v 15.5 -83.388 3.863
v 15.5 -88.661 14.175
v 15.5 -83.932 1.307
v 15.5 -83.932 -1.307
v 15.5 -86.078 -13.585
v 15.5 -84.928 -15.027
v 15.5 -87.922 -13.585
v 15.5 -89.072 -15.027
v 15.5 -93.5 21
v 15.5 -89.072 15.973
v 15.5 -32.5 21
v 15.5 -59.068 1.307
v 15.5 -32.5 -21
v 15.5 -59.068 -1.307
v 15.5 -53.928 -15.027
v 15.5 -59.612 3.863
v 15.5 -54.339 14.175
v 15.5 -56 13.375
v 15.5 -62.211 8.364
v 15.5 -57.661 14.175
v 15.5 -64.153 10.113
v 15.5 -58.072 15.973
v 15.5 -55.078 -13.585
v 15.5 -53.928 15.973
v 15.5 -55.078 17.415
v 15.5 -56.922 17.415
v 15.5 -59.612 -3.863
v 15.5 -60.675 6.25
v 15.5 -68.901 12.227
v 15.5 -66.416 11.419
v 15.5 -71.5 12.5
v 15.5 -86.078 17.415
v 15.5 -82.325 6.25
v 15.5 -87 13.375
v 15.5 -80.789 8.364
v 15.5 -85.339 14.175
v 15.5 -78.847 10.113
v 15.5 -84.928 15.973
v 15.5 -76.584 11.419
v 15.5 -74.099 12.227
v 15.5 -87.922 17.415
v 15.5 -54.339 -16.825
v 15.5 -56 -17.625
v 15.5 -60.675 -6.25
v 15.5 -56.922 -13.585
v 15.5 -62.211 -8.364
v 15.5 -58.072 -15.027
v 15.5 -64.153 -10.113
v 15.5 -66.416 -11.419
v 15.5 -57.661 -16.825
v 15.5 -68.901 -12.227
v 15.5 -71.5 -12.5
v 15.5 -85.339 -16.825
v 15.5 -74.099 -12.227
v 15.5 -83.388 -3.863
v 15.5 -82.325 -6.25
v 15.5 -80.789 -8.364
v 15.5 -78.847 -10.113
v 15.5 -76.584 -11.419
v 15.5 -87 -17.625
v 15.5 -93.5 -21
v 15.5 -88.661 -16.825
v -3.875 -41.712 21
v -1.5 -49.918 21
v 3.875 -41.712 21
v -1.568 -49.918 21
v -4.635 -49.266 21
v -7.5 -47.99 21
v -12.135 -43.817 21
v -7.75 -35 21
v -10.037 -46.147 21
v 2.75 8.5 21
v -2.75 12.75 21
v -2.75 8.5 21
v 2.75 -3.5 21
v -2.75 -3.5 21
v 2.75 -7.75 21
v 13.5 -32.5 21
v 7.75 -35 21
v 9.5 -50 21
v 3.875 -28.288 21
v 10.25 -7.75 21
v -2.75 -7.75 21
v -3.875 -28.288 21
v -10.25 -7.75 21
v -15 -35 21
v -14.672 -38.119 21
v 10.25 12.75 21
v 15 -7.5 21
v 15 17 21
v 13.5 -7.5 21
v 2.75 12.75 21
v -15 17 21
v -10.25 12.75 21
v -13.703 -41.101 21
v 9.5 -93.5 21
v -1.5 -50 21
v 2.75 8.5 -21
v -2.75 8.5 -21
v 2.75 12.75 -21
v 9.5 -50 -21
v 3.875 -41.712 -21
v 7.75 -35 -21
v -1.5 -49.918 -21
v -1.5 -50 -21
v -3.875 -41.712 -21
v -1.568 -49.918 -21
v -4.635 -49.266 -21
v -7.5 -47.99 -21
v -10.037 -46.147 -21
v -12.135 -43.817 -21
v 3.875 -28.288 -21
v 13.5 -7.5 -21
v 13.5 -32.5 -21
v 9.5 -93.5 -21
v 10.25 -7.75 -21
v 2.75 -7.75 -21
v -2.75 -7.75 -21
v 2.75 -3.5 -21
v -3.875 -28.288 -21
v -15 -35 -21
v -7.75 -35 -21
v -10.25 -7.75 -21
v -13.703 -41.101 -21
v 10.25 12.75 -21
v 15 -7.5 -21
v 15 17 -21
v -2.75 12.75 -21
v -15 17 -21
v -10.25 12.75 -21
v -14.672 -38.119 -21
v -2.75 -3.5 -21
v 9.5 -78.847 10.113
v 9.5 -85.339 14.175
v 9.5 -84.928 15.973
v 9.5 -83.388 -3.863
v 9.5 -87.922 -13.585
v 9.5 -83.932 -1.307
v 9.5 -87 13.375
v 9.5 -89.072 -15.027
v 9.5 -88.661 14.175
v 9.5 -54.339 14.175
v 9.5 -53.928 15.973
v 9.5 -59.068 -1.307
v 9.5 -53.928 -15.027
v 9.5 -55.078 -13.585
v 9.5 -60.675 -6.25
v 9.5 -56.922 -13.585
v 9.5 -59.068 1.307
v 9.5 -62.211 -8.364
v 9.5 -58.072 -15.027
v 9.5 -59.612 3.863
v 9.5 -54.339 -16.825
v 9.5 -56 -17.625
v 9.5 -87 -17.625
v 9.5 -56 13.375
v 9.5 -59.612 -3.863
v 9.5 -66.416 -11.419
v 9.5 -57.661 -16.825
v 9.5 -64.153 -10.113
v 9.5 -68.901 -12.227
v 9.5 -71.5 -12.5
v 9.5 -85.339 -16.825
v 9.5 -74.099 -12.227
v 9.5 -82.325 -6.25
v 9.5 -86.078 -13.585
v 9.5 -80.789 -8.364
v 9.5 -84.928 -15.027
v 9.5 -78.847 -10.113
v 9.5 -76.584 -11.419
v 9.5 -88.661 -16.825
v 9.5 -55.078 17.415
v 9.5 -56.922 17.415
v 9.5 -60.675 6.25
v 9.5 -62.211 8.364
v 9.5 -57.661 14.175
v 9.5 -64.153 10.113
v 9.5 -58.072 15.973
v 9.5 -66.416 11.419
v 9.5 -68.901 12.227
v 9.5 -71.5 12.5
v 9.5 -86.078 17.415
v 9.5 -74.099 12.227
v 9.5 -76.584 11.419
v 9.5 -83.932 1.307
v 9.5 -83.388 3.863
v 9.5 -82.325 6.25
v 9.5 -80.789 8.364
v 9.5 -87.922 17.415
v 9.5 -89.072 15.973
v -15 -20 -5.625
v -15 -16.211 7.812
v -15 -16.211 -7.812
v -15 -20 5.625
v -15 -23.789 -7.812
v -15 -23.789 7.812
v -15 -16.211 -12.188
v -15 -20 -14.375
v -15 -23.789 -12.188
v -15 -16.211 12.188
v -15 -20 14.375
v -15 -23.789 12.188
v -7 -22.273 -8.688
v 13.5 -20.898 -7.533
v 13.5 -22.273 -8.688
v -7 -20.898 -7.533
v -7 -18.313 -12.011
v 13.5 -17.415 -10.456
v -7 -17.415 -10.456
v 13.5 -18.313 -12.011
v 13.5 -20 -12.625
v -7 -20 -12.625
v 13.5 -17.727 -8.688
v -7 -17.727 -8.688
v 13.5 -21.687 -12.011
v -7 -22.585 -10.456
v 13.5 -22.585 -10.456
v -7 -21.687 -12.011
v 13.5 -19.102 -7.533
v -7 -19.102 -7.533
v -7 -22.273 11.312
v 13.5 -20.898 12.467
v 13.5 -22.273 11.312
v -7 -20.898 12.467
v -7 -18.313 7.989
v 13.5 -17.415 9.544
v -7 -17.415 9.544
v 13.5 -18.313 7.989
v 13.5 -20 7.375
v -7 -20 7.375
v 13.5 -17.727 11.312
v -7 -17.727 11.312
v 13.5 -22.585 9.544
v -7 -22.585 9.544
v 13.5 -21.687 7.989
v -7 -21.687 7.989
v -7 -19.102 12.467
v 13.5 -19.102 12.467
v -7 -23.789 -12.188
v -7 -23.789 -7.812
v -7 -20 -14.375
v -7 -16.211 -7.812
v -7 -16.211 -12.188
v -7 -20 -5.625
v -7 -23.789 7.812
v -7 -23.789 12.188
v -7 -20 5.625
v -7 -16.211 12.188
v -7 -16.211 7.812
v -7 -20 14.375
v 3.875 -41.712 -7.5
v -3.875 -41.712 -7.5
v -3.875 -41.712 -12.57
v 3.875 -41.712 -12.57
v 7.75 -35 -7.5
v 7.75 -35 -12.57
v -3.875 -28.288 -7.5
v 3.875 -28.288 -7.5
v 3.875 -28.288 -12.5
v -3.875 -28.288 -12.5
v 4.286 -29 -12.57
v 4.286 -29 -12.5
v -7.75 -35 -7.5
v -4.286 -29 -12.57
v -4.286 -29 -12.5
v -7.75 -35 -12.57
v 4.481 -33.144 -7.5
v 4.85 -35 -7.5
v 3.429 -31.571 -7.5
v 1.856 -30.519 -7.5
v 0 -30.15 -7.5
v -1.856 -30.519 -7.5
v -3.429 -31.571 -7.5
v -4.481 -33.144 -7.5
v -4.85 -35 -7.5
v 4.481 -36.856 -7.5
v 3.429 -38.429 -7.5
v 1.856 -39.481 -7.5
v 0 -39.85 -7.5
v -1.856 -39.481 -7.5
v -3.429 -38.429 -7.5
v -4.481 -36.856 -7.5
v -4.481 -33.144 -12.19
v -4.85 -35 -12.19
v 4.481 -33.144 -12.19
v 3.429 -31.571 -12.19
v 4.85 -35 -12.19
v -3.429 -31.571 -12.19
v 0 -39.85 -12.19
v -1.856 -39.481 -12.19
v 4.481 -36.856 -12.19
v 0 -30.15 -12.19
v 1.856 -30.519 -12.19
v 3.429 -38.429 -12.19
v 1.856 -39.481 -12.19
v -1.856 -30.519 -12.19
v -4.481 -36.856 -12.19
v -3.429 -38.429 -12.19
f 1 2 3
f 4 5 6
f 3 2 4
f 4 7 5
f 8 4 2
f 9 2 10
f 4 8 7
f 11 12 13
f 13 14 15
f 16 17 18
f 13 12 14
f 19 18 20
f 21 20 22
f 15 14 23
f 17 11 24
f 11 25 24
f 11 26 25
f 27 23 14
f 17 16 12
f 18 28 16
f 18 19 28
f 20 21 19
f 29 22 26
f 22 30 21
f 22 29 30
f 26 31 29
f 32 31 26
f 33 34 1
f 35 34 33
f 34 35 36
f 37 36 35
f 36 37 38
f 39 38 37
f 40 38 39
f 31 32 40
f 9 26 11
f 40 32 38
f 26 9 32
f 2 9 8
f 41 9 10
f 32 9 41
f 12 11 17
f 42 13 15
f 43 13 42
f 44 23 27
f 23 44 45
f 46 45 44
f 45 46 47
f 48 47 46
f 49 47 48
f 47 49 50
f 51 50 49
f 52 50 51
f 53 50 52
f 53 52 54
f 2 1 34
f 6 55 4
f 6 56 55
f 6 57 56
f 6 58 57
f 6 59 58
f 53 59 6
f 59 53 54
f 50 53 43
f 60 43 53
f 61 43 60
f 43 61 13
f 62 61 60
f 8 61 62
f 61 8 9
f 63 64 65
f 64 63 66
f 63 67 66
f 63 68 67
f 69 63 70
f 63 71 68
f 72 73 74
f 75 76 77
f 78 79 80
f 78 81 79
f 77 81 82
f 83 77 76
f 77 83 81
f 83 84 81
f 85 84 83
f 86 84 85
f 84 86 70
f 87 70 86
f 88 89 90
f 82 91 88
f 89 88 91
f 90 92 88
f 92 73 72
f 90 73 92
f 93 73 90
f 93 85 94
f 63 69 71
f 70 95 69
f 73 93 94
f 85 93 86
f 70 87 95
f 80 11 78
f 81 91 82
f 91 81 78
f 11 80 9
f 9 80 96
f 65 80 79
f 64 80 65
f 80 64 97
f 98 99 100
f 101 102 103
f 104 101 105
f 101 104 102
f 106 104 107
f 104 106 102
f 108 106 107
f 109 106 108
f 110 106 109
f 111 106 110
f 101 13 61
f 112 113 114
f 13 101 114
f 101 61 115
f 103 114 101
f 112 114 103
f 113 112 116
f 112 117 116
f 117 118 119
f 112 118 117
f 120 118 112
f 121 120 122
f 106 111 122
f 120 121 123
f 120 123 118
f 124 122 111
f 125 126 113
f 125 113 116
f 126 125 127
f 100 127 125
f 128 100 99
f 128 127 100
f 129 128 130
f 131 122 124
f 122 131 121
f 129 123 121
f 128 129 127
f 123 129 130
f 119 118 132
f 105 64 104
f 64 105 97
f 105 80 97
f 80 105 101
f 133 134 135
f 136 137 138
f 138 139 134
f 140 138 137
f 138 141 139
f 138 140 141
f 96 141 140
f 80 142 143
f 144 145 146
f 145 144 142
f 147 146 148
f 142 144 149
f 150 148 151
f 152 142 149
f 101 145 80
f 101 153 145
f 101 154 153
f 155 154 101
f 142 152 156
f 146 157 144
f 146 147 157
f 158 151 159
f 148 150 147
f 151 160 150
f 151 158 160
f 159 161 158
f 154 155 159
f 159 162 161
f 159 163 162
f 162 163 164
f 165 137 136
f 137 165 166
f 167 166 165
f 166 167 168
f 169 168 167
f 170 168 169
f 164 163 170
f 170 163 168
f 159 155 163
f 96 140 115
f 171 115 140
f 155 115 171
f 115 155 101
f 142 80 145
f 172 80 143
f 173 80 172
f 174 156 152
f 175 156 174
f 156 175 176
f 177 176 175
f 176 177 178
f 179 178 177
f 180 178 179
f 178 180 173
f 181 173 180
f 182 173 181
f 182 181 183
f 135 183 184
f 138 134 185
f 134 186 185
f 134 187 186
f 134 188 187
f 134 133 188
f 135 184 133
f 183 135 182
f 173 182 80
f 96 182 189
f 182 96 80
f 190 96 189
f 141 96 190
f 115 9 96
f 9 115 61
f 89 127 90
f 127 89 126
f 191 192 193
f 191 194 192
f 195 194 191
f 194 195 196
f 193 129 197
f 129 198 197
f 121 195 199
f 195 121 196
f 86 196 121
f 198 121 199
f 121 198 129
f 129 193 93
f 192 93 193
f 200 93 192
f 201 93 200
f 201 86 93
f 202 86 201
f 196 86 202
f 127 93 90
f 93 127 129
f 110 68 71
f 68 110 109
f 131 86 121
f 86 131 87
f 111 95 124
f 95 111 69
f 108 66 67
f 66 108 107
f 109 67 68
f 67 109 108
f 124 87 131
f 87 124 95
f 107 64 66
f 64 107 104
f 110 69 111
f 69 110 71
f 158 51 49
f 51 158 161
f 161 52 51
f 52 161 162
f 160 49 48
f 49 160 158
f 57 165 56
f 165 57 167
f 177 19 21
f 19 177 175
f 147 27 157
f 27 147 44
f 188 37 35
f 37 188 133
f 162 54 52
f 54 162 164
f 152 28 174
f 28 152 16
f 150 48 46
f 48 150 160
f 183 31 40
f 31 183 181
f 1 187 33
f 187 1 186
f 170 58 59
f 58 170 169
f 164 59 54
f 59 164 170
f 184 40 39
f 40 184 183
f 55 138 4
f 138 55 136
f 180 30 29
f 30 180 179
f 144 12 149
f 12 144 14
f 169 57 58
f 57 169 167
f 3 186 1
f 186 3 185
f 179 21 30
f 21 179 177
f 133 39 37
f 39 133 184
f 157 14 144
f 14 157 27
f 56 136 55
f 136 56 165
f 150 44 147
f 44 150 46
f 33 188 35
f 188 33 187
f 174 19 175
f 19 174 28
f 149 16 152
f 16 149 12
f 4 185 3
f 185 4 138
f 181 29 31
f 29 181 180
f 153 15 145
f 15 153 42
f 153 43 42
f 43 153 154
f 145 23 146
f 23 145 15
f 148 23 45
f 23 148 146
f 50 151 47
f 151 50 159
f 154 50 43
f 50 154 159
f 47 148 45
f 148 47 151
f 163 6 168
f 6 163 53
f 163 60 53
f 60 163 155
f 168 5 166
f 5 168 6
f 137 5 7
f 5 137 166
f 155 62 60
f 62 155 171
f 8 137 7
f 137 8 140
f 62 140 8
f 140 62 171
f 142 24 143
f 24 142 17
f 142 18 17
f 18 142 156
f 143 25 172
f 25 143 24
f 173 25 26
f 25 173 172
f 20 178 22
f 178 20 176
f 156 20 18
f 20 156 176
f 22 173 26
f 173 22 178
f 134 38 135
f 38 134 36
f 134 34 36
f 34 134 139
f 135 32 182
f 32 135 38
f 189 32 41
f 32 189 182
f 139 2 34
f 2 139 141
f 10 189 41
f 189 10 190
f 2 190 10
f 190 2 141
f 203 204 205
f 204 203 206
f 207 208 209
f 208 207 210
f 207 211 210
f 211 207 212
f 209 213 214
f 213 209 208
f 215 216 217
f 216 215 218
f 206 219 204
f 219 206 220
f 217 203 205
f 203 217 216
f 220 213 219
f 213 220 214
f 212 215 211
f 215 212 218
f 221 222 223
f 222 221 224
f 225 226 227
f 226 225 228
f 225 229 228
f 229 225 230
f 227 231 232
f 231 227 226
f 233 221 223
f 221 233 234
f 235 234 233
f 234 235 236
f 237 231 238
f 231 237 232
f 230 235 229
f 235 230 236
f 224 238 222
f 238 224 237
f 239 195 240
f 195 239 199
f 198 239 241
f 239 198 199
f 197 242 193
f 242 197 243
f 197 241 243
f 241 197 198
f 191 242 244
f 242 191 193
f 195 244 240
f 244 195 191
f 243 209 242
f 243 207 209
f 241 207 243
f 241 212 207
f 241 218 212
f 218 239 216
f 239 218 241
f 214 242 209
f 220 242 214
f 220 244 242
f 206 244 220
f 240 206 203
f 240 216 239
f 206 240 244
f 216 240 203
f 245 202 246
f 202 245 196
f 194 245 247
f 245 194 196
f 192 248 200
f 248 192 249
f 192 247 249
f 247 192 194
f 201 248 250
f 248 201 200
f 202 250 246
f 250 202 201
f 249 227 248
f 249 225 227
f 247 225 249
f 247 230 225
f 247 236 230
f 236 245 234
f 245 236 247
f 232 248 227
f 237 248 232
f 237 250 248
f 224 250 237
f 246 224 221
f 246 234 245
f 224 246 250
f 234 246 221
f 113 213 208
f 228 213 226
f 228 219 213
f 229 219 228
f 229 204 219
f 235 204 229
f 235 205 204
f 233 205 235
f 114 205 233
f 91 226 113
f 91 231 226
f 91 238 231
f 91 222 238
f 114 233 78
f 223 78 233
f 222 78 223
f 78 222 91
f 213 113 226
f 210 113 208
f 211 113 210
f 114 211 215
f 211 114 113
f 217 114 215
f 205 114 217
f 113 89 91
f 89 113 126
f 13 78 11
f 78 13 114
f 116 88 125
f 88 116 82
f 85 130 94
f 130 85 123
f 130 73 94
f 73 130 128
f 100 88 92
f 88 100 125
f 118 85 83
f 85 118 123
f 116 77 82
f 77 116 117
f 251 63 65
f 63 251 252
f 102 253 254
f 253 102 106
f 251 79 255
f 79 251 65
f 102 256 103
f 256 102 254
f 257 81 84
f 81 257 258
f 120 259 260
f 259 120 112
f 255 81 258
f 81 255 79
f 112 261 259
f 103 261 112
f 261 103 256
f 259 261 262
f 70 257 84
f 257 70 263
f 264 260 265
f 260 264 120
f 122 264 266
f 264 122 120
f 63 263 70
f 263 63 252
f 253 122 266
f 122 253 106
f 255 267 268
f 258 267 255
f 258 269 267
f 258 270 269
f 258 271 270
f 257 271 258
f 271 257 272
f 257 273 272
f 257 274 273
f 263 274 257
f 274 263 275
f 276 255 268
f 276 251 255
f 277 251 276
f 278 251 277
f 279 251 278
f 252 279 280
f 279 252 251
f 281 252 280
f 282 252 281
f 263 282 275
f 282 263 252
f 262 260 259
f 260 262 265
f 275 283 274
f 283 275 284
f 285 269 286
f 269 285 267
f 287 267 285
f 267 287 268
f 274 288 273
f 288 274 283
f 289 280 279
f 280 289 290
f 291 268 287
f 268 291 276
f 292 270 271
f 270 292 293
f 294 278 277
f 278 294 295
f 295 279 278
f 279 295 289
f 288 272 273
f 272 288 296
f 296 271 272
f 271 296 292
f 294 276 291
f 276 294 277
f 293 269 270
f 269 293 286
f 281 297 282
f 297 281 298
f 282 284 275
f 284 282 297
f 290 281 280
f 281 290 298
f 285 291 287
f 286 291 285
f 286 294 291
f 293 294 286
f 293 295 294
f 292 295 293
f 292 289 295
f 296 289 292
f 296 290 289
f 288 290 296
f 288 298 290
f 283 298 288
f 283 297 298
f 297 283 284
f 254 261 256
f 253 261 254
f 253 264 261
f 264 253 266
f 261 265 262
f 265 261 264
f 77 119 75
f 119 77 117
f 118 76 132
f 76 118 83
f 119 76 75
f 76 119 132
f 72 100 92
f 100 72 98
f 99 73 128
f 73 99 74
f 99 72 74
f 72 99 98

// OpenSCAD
// file: Rook_Config.scad
// Rook 3D Printer Configuration
// Created By Jeffrey Olijar 
// Jolijar@gmail.com

// Layer Height
LH = 0.38;

// 608 skate bearing
Bearing_OD = 23; 
Bearing_ID = 8;
Bearing_H = 7;

// M3 Nut Diameter
N3 = 7.5;

// M3 Screw Hole Diameter
M3 = 4.25;

// M4 Screw Hole Diameter
M4 = 5.25;
N4 = 8.75;

// M5 Screw Hole Diameter
M5 = 6;

// M8 Rod Diameter (configure for a tight fit)
M8 = 8.2;

// M8 Nut Diameter
N8 = 15.5;

//LM8UU Bearing
LBD = 15.4; // Diameter
LBH = 25; // Height
LBI = 8;  // Inner Diameter

//Makergear Groovemount
GVO = 16.5; // Outside Diameter
GVI = 12.5;  // Inside Groove Diameter

// Distance Between Centers for X rods
DBCX = 70;
// main file
// Rook 3D Printer 
// X Motor Holder
// Created By Jeffrey Olijar 
// Jolijar@gmail.com
// Revision 1.00
// 1 x requred 


include <Rook_Config.scad>

module Rook_X_Motor(){




// Slider Part 
translate(v=[0,-6,0]){ cube(size = [5.5,5,42], center = true);}
translate(v=[0,11,0]){ cube(size = [5.5,5,42], center = true);}
translate(v=[2.5,2.5,0])rotate(a=[0,0,90]){ 
//translate(v=[0,-6,0]){ cube(size = [5.5,5,42], center = true);}
//translate(v=[0,11,0]){ cube(size = [5.5,5,42], center = true);}
}
difference(){ 
union(){
translate(v=[7,-40,0]){ 
cube(size = [17,20,42], center = true);
}
translate(v=[12.5,-71.5,0]){ 
cube(size = [6,44,42], center = true);
}




// Misumi Rail Box
translate(v=[0,2,0]){ cube(size = [30,30,42], center = true);}


translate(v=[0,-23.5,0]){ cube(size = [30,23,42], center = true);}
translate(v=[0,-35,-21]){cylinder(h = 42, r=15);}

}

union(){


rotate(a=[0,90,0])translate(v=[0,-71.5,0]){ 
cylinder(h=43,r=12.5, center = true);
translate(v=[15.5,15.5,0]){ 
cylinder(h=20,r= M3/2);
}
translate(v=[15.5,-15.5,0]){
cylinder(h=20,r=M3/2);
}
translate(v=[-15.5,15.5,0]){
cylinder(h=20,r=M3/2);
}
translate(v=[-15.5,-15.5,0]){
cylinder(h=20,r=M3/2);
}

}
rotate(a=[0,90,0])translate(v=[0,40,0]){ 
translate(v=[10,-60,-20]){ cylinder(h=50,r=M4/2);}
translate(v=[-10,-60,-20]){cylinder(h=50,r=M4/2);}
translate(v=[10,-60,-32]){cylinder(h=50,r=N4/2,$fn=6, center = true);}
translate(v=[-10,-60,-32]){cylinder(h=50,r=N4/2,$fn=6, center = true);}
translate(v=[0,-60,16]){cube(size = [43,25,5], center = true);}
}
// Misumi Rail Cutout
translate(v=[0,2.5,0]){ cube(size = [20.5,20.5,43], center = true);}
//translate(v=[-20,3,0])rotate(a=[0,90,0]){cylinder(h=100,r=M5/2);}

//translate(v=[0,-35,-25]){cylinder(h = 100, r=Bearing_ID);}
translate(v=[0,-35,0]){cylinder(h=43,r=N8/2,$fn=6, center = true);}

}}




translate(v=[0,-25,0]){ 

translate(v=[0,-12,-12-LH]){ 
cube(size = [20,16,LH], center = true);
}

difference(){ 
union(){

translate(v=[0,-11,-10]){ 
cube(size = [20,16,5], center = true);
}
}
union(){
translate(v=[0,-10,0]){ 
cylinder(h=50,r=M8/2+0.75, center = true);
}
}
}
}


}
Rook_X_Motor();
